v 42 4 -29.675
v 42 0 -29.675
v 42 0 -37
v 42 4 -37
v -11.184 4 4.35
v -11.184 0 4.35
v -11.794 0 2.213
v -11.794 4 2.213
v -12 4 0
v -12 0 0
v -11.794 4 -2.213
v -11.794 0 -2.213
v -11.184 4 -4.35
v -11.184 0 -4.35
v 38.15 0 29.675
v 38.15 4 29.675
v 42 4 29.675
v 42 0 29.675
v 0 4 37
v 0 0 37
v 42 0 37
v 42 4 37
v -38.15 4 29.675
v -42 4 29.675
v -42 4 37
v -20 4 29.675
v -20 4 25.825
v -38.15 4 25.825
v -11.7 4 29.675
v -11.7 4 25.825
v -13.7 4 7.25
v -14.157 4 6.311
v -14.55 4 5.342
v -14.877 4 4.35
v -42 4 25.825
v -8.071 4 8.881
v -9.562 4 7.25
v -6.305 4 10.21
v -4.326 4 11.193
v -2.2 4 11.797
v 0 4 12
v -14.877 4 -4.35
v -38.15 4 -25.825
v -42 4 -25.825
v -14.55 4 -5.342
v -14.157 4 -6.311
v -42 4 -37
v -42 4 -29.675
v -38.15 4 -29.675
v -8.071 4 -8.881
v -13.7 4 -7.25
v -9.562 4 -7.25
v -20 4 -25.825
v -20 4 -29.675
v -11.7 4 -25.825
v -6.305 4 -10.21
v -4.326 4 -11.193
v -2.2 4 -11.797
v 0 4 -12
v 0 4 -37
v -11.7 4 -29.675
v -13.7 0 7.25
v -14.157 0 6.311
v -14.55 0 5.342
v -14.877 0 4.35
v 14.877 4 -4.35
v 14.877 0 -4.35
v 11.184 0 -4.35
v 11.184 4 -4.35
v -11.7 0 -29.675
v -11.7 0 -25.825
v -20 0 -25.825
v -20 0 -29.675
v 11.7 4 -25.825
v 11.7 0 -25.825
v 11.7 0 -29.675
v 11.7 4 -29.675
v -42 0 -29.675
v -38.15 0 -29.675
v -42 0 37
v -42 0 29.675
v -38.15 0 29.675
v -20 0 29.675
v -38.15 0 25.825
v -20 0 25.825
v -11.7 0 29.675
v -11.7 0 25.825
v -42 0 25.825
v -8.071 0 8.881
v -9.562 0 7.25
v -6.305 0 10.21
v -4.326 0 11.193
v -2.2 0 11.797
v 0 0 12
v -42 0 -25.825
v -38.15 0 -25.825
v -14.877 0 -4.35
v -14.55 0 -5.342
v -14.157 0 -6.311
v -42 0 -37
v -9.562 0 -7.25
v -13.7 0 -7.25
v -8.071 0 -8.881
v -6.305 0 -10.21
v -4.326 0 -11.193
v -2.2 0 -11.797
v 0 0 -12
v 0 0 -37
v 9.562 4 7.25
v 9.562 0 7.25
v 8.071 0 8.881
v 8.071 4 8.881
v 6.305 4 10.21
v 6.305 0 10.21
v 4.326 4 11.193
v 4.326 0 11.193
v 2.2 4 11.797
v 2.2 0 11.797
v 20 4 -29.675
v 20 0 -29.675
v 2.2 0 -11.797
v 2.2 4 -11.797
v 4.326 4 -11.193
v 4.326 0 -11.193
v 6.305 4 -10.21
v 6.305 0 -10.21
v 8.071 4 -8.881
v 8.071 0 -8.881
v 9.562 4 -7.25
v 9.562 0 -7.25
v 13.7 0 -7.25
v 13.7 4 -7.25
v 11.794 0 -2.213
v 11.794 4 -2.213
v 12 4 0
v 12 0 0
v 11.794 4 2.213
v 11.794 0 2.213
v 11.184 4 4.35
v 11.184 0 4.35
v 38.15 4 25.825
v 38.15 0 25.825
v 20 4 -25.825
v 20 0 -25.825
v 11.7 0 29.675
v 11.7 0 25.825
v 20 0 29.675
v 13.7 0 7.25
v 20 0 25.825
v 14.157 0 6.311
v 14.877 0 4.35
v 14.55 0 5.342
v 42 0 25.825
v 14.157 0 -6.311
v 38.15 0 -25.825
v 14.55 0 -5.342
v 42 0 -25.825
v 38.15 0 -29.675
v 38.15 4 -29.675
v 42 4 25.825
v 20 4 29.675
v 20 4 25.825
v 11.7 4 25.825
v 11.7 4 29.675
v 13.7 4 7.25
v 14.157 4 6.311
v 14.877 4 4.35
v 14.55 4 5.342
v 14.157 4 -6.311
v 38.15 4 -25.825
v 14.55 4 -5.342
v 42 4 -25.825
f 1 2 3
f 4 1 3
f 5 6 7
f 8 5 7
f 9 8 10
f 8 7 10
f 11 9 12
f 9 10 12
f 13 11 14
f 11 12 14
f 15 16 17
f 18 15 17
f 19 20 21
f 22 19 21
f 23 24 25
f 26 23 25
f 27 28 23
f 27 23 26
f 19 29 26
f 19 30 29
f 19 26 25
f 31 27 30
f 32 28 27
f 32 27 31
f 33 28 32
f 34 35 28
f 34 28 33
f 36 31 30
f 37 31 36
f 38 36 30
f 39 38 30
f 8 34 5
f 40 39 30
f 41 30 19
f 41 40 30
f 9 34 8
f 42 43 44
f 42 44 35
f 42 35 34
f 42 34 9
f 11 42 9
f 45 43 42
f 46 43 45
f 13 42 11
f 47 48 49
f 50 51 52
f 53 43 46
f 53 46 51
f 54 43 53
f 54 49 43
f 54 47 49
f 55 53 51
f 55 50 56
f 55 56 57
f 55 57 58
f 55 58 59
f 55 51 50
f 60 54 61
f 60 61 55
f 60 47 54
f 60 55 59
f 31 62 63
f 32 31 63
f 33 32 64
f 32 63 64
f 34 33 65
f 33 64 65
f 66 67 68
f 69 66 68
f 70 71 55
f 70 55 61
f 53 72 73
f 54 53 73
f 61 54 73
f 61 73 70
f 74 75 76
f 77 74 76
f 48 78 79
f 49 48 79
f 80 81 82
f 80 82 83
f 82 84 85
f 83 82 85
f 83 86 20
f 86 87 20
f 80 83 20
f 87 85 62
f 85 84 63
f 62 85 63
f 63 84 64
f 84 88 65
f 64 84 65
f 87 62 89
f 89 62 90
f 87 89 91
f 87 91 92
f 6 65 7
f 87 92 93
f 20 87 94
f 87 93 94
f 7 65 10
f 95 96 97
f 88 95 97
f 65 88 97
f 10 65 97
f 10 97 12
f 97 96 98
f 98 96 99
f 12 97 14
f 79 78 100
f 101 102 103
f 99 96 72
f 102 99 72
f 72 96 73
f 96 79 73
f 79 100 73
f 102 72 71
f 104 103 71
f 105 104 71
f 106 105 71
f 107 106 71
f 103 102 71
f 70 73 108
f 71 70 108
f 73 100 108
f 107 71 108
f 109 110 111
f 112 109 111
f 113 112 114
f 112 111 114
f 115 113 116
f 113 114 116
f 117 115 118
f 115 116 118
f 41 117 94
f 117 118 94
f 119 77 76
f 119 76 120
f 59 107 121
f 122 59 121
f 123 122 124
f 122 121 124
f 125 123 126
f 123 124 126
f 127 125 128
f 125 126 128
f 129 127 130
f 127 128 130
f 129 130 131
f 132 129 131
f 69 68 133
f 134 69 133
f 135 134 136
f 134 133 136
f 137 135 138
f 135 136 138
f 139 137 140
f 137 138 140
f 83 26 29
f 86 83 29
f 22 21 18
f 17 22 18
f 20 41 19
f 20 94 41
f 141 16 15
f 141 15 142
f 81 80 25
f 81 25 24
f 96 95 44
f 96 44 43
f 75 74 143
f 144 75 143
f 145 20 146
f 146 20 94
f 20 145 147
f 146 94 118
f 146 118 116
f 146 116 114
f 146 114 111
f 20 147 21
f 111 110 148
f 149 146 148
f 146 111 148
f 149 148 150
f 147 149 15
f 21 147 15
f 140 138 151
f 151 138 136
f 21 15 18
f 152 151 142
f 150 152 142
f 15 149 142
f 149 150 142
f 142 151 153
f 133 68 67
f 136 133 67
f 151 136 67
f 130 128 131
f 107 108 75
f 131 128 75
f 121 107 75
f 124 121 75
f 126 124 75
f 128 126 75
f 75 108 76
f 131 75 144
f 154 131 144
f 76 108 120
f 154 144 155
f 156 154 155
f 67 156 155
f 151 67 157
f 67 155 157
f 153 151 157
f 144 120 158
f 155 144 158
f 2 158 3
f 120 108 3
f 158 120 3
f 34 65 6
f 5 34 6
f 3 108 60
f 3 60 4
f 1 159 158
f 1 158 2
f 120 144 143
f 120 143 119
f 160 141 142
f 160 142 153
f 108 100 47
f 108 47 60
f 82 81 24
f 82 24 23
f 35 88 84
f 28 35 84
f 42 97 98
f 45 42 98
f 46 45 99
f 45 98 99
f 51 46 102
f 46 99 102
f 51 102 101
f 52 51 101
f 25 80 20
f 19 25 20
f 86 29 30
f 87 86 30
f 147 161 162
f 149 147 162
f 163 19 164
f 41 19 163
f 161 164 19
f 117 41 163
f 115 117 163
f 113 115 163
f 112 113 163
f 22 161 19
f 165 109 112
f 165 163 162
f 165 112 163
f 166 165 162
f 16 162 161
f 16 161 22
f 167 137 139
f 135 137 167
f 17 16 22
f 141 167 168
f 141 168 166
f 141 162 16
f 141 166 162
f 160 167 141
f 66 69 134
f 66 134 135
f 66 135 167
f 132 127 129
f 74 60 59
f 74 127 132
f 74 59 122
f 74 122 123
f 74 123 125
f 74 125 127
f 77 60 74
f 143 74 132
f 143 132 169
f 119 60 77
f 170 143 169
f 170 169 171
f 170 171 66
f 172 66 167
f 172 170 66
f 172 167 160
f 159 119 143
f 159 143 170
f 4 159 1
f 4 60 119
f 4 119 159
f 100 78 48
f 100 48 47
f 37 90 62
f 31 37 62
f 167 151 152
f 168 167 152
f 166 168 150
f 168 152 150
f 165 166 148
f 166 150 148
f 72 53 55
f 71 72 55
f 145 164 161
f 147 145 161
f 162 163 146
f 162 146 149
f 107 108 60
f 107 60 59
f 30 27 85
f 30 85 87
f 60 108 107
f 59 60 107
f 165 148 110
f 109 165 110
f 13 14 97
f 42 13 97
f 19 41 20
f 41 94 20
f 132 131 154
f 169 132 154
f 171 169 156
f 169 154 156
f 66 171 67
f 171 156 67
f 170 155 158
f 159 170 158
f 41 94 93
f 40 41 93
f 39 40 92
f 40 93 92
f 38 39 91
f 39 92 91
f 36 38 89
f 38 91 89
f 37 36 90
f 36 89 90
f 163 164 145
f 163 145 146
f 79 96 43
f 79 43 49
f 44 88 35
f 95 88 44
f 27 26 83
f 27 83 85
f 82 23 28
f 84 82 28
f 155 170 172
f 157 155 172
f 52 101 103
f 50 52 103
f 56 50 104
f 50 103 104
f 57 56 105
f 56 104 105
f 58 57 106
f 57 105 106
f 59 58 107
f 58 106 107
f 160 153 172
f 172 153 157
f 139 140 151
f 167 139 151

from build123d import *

# Parameters (mm, degrees)
SKETCH2_W               = 84
SKETCH2_H               = 74
BOSS_EXTRUDE1_DEPTH     = 4
SKETCH4_W               = 8.3
SKETCH4_H               = 3.85
SKETCH4_W_2             = 3.85
CUT_EXTRUDE2_DEPTH      = 1
CUT_EXTRUDE2_DEPTH_BACK = 5


with BuildPart() as part:
    # Sketch2 → Boss-Extrude1 (new body)
    with BuildSketch(Plane(origin=(0, 0, 0), x_dir=(1, 0, 0), z_dir=(0, 1, 0))):
        Rectangle(SKETCH2_W, SKETCH2_H)
        with BuildLine():
            ThreePointArc((11.183805256, 4.35), (12, 0), (11.183805256, -4.35))
            Line((11.183805256, -4.35), (14.877079687, -4.35))
            ThreePointArc((14.877079687, -4.35), (14.361878956, -5.829788405), (13.699908759, -7.25))
            Line((13.699908759, -7.25), (9.562295749, -7.25))
            ThreePointArc((9.562295749, -7.25), (0, -12), (-9.562295749, -7.25))
            Line((-9.562295749, -7.25), (-13.699908759, -7.25))
            ThreePointArc((-13.699908759, -7.25), (-14.361878956, -5.829788405), (-14.877079687, -4.35))
            Line((-14.877079687, -4.35), (-11.183805256, -4.35))
            ThreePointArc((-11.183805256, -4.35), (-12, 0), (-11.183805256, 4.35))
            Line((-11.183805256, 4.35), (-14.877079687, 4.35))
            ThreePointArc((-14.877079687, 4.35), (-14.361878956, 5.829788405), (-13.699908759, 7.25))
            Line((-13.699908759, 7.25), (-9.562295749, 7.25))
            ThreePointArc((-9.562295749, 7.25), (0, 12), (9.562295749, 7.25))
            Line((9.562295749, 7.25), (13.699908759, 7.25))
            ThreePointArc((13.699908759, 7.25), (14.361878956, 5.829788405), (14.877079687, 4.35))
            Line((14.877079687, 4.35), (11.183805256, 4.35))
        make_face(mode=Mode.SUBTRACT)
    extrude(amount=BOSS_EXTRUDE1_DEPTH)


with BuildPart() as body_2:
    # Split1: the piece on the far side of the plane
    add(part.part)
    split(bisect_by=Plane(origin=(0, 0, 0), x_dir=(0, 0, 1), z_dir=(1, 0, 0)), keep=Keep.BOTTOM)


with BuildPart() as part_1:
    add(part.part)

    # Split1
    split(bisect_by=Plane(origin=(0, 0, 0), x_dir=(0, 0, 1), z_dir=(1, 0, 0)), keep=Keep.TOP)


with BuildPart() as cut_extrude2_tool:
    # Sketch4 → Cut-Extrude2 (new body, two sides)
    with BuildSketch(Plane(origin=(0, 4, 0), x_dir=(1, 0, 0), z_dir=(0, 1, 0))) as cut_extrude2_sk:
        with Locations((-15.85, -27.75)):
            Rectangle(SKETCH4_W, SKETCH4_H)
        with Locations((-40.075, -27.75)):
            Rectangle(SKETCH4_W_2, SKETCH4_H)
        with Locations((40.075, -27.75)):
            Rectangle(SKETCH4_W_2, SKETCH4_H)
        with Locations((15.85, -27.75)):
            Rectangle(SKETCH4_W, SKETCH4_H)
        with Locations((15.85, 27.75)):
            Rectangle(SKETCH4_W, SKETCH4_H)
        with Locations((40.075, 27.75)):
            Rectangle(SKETCH4_W_2, SKETCH4_H)
        with Locations((-40.075, 27.75)):
            Rectangle(SKETCH4_W_2, SKETCH4_H)
        with Locations((-15.85, 27.75)):
            Rectangle(SKETCH4_W, SKETCH4_H)
    extrude(amount=CUT_EXTRUDE2_DEPTH)
    extrude(cut_extrude2_sk.sketch, amount=-CUT_EXTRUDE2_DEPTH_BACK)


with BuildPart() as part_2:
    add(part_1.part)

    # Cut-Extrude2: cut by cut_extrude2_tool
    add(cut_extrude2_tool.part, mode=Mode.SUBTRACT)


with BuildPart() as body_2_1:
    add(body_2.part)

    # Cut-Extrude2: cut by cut_extrude2_tool
    add(cut_extrude2_tool.part, mode=Mode.SUBTRACT)


solid = Compound([part_2.part, body_2_1.part])
